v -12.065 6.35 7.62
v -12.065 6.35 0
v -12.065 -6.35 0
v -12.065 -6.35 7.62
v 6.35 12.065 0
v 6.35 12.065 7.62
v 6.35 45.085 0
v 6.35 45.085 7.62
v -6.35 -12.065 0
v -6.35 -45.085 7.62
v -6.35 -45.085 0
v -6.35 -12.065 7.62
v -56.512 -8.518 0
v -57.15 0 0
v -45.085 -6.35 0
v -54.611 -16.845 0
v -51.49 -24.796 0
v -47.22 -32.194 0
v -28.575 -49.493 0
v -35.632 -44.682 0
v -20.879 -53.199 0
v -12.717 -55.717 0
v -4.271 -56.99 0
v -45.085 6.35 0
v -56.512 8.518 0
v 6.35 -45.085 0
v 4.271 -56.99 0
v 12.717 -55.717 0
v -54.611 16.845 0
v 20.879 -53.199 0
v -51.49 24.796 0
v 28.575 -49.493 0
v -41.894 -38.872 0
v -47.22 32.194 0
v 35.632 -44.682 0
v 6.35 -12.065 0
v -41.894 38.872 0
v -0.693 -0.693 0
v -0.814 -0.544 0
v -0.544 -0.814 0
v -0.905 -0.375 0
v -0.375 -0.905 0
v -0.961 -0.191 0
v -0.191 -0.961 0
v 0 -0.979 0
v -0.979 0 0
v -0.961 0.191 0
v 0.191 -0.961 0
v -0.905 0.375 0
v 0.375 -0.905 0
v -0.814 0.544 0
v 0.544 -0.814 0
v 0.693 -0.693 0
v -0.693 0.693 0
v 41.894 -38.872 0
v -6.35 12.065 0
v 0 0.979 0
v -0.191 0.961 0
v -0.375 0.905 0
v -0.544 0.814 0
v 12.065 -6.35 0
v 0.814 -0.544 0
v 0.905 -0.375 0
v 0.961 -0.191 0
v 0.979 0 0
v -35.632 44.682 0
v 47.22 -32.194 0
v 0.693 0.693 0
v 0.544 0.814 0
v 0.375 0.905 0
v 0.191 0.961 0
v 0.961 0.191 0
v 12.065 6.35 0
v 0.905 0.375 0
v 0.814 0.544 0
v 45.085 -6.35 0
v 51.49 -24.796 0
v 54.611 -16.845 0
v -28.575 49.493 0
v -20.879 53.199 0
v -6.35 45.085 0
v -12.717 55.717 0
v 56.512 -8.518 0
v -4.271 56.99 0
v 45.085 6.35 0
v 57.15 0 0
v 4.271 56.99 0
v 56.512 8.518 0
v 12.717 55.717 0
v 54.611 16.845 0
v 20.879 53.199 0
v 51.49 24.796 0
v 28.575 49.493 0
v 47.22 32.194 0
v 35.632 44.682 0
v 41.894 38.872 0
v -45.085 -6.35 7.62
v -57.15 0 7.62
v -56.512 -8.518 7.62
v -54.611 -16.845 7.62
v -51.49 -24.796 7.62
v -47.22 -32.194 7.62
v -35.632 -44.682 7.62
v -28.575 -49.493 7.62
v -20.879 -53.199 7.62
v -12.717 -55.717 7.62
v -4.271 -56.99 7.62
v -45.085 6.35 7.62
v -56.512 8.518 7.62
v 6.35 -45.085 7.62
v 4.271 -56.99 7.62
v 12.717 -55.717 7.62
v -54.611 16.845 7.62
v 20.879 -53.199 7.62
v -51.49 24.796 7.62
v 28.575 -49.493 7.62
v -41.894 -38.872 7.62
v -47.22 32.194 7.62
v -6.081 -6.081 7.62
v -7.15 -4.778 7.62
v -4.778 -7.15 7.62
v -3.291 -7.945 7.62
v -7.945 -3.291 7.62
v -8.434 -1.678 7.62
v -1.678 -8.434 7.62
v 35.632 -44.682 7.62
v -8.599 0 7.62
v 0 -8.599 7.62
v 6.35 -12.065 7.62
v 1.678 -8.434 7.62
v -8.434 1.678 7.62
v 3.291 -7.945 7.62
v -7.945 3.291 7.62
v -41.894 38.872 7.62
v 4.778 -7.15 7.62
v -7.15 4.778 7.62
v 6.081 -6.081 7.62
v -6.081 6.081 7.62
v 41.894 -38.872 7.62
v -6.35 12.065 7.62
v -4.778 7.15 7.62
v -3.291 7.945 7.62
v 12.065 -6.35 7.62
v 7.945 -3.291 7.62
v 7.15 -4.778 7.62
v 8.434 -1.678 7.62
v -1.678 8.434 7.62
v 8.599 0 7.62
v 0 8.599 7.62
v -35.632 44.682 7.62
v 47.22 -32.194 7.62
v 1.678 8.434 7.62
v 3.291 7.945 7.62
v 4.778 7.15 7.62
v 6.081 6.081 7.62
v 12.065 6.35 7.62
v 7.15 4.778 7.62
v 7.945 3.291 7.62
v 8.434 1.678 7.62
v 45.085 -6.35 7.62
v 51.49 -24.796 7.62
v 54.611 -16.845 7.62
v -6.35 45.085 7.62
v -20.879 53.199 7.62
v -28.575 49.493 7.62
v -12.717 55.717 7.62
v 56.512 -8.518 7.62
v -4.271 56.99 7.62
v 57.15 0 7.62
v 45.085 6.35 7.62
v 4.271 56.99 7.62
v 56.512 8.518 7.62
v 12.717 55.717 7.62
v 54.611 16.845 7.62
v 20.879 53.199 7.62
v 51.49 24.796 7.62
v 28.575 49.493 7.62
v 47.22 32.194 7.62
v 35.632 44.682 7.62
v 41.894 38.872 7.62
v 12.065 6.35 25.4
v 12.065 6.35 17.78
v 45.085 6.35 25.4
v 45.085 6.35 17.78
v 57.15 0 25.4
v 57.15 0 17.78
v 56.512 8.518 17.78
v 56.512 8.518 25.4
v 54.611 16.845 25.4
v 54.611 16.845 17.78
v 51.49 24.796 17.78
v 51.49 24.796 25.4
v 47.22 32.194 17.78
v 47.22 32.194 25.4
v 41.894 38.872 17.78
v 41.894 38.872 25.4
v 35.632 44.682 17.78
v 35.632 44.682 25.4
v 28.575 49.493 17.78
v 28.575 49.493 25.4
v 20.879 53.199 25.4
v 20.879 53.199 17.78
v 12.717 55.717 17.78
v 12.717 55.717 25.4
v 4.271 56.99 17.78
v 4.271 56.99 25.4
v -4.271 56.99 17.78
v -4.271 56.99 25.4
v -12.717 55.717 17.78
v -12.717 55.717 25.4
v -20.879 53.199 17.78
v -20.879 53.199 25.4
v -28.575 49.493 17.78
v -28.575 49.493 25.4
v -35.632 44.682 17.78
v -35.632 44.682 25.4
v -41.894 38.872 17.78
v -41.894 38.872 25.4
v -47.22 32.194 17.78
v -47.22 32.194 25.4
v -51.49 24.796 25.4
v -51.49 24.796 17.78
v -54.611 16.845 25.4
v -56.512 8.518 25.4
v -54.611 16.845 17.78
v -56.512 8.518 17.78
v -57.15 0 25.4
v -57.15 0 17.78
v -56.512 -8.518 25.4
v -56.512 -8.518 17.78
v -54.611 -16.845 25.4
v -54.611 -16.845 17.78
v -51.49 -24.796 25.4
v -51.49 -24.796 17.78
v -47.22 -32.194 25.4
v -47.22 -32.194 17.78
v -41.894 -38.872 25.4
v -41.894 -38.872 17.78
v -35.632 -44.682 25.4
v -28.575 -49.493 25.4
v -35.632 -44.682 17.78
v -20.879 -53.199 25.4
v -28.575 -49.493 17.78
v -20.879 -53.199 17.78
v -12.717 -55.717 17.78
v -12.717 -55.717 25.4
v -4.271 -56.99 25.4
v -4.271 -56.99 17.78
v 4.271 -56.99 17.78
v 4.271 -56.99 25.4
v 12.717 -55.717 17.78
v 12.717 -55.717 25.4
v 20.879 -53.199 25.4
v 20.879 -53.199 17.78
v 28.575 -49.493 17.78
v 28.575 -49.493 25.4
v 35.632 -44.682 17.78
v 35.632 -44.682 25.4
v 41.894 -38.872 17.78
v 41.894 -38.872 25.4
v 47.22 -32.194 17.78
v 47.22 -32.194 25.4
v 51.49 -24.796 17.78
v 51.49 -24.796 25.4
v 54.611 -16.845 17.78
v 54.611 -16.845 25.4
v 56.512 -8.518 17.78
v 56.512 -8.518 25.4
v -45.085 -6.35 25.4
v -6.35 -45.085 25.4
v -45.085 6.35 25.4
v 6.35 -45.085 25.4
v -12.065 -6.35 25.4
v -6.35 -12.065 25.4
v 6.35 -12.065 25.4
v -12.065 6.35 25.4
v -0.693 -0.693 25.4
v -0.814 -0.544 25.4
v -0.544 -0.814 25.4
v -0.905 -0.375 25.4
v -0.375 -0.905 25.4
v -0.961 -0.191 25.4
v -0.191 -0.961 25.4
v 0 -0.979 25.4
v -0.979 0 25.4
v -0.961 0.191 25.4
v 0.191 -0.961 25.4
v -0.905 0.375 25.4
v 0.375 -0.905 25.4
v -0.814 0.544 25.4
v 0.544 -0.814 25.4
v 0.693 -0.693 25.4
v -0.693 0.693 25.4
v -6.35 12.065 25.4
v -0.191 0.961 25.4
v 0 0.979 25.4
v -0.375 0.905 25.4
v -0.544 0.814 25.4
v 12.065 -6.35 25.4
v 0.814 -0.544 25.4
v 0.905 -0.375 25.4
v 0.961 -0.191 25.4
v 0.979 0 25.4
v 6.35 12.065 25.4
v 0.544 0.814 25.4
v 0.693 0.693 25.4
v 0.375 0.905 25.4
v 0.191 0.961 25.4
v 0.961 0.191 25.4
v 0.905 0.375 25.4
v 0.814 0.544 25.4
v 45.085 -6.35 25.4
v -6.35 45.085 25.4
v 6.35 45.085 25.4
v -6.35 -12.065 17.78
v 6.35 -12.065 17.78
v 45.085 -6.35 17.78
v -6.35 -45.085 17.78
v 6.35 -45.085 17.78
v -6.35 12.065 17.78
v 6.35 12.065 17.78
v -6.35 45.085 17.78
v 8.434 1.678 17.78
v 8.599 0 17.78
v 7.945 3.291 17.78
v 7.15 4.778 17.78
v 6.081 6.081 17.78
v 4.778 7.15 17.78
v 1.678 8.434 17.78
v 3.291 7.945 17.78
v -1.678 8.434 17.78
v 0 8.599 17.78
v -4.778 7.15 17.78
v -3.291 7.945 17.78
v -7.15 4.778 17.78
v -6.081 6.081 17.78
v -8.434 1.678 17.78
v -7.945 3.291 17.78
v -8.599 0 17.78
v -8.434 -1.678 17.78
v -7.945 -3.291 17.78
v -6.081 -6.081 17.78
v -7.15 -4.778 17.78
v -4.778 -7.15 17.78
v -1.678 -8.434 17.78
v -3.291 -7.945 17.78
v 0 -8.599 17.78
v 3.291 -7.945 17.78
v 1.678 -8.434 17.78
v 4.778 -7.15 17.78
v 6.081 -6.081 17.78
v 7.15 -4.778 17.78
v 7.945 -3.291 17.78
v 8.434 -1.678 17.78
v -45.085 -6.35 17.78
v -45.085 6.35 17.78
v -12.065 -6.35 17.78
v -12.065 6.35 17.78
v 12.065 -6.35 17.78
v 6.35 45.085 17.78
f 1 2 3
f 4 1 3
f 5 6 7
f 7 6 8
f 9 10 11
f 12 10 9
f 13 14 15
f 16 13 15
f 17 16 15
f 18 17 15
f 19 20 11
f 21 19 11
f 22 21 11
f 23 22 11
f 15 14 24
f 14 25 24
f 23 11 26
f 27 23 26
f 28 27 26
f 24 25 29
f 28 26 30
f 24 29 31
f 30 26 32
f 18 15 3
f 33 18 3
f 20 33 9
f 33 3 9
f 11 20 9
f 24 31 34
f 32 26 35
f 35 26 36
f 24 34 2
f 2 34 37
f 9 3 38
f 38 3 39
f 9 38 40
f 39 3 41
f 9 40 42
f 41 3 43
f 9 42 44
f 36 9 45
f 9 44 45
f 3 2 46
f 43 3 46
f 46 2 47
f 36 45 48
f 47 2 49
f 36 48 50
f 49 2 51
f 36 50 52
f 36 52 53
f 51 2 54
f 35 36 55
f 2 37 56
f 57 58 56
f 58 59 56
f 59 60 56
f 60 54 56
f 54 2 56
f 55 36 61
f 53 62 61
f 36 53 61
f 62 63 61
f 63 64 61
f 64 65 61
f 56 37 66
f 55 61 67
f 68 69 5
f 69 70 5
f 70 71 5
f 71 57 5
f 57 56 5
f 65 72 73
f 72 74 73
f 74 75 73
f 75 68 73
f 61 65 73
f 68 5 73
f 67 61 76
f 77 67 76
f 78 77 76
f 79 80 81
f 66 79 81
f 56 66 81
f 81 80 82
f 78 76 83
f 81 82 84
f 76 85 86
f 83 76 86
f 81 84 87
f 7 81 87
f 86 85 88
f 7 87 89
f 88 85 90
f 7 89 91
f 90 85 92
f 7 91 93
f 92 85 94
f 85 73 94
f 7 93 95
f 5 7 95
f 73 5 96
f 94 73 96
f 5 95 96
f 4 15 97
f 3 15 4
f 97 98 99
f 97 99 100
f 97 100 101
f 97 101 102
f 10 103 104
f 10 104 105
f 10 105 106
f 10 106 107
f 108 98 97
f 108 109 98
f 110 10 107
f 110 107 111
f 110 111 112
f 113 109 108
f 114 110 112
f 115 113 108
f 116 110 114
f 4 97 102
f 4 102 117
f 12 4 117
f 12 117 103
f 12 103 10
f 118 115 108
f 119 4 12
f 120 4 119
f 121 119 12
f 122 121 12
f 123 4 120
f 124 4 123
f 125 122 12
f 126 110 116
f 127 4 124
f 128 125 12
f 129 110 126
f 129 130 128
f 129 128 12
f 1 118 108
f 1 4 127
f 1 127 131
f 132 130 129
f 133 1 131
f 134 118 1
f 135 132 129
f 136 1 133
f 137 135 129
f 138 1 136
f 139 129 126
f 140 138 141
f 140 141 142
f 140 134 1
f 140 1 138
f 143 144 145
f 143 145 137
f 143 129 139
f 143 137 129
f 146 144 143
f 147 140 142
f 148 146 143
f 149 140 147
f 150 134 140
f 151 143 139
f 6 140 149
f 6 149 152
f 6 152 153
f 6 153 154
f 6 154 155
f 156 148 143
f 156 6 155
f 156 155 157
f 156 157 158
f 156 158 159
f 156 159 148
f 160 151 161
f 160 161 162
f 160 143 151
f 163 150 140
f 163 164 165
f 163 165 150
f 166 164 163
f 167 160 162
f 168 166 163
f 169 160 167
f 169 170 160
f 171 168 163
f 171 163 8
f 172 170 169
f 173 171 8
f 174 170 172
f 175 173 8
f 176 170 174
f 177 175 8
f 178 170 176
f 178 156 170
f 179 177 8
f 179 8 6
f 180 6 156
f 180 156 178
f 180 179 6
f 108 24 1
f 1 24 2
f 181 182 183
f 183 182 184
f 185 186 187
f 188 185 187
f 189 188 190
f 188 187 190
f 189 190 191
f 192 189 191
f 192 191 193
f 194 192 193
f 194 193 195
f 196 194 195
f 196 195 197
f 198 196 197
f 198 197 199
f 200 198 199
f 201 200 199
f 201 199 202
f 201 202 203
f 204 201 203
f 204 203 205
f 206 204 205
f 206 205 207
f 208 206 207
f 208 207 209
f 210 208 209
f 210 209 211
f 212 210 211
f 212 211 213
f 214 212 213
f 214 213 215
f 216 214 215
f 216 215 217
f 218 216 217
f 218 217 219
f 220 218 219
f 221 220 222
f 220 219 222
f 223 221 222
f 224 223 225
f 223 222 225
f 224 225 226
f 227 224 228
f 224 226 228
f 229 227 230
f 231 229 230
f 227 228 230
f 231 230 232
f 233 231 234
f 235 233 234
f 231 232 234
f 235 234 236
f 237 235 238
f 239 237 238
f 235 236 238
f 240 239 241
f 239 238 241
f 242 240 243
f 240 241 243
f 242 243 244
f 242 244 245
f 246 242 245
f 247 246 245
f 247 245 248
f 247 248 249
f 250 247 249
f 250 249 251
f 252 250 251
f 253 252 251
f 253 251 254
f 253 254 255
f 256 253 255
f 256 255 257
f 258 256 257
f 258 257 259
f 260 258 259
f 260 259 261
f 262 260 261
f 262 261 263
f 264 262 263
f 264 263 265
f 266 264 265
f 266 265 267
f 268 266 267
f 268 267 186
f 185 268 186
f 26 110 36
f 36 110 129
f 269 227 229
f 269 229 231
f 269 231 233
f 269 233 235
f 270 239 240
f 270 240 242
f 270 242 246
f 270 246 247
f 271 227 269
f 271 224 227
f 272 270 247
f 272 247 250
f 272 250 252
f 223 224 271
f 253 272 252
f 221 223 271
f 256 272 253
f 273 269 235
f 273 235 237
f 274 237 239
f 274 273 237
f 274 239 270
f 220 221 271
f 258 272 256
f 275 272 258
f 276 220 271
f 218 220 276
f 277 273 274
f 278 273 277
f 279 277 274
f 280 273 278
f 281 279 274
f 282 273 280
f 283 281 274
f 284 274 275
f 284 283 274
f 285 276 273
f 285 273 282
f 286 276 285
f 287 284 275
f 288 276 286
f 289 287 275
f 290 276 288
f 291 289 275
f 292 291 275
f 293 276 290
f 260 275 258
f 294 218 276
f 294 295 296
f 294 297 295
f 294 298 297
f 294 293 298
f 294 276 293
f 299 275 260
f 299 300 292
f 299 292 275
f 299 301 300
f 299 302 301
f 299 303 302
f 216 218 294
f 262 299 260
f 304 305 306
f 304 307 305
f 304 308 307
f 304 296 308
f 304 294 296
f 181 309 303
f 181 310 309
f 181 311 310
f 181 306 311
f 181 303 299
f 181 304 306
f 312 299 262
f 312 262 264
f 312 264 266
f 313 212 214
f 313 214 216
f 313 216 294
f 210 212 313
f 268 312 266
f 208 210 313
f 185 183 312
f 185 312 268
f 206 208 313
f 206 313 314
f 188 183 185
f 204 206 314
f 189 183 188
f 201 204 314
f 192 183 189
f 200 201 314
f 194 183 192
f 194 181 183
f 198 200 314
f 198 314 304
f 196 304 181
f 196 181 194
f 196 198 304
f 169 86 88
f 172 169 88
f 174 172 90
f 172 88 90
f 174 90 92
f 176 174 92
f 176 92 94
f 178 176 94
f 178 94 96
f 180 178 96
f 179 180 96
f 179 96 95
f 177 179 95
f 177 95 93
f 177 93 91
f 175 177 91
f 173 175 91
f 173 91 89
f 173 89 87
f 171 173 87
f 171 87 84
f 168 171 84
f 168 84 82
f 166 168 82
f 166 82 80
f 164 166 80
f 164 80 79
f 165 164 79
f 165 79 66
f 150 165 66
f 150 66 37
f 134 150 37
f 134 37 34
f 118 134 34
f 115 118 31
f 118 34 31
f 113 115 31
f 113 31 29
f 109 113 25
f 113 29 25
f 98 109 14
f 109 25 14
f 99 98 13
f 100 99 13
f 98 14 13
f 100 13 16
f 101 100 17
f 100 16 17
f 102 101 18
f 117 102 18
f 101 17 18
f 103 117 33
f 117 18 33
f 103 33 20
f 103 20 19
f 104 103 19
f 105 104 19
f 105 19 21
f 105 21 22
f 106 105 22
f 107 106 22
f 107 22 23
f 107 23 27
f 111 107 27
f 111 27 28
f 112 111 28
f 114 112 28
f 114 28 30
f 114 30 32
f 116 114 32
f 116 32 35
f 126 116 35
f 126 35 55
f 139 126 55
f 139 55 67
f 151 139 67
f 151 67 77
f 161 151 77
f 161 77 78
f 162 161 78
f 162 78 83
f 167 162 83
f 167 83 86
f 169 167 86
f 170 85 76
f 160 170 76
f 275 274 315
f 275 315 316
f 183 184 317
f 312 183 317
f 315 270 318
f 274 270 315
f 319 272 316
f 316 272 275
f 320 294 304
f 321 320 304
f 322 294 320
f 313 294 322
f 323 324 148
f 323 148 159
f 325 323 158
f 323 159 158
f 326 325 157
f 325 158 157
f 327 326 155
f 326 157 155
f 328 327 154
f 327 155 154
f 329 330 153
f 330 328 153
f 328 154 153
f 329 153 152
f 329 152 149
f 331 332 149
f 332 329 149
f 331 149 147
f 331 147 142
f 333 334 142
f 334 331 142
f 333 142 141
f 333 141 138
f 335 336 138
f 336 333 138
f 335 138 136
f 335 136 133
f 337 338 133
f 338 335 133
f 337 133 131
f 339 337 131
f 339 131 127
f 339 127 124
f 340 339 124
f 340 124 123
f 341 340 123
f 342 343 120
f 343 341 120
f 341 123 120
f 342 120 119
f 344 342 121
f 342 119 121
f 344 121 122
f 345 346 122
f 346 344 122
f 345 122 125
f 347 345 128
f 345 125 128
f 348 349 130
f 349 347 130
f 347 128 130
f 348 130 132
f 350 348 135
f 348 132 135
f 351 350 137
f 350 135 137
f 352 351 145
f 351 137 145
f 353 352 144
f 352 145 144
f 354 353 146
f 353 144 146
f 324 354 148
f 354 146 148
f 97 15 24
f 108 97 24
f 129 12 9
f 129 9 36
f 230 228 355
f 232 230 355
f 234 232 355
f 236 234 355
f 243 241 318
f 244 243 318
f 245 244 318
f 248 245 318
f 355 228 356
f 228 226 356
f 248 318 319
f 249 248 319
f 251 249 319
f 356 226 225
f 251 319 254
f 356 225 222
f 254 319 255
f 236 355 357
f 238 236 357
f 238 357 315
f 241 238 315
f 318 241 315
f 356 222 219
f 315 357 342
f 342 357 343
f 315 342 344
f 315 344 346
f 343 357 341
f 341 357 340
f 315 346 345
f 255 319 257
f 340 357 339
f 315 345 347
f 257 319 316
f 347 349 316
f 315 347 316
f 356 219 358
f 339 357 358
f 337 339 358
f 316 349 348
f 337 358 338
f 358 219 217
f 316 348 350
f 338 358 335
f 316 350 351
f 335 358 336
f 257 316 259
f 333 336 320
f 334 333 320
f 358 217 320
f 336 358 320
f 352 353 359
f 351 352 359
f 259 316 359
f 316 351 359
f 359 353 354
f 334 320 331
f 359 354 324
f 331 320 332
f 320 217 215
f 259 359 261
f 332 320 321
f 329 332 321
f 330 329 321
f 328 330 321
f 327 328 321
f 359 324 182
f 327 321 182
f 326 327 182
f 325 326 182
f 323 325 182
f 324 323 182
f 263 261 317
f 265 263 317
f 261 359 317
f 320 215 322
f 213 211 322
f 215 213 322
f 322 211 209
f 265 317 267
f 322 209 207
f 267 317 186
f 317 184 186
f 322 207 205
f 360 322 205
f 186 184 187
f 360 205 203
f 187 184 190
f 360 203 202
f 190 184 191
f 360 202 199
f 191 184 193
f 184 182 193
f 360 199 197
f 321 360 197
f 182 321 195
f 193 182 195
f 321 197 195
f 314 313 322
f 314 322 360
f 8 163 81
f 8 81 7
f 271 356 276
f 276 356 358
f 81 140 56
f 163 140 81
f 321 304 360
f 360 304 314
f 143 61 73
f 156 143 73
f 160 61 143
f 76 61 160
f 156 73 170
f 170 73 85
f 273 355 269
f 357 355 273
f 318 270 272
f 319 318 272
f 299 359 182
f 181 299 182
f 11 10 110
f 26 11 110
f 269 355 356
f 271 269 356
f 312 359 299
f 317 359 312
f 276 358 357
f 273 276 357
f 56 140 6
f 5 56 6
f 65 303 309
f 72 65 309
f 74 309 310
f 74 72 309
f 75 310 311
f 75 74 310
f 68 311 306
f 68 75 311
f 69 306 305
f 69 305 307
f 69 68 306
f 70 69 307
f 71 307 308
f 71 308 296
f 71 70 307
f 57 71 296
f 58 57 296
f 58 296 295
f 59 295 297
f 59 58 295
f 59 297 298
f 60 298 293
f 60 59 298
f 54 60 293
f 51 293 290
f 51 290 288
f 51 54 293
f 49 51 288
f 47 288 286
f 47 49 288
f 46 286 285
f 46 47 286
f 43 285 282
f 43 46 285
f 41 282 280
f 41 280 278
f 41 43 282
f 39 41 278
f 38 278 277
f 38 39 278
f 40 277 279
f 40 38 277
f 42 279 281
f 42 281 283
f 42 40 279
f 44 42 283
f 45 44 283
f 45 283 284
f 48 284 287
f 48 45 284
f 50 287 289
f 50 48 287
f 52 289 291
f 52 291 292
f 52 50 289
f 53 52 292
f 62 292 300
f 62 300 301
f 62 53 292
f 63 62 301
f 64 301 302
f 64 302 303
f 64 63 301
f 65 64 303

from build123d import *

# Parameters (mm, degrees)
F0_R     = 57.15
F0_R_2   = 0.9794958553
F1_DEPTH = 25.4
F3_T     = -7.62
F4_W     = 12.7
F4_H     = 33.02
F5_DEPTH = 25.4
F6_DEPTH = 25.4
F7_W     = 33.02
F7_H     = 6.35
F8_DEPTH = 25.4


# Not quite as in the source:
# - a feature of the source that left no trace in its solid (it failed there, or was rolled back) is left out


with BuildPart() as f1:
    # F0 (on Top) → F1 (new body)
    with BuildSketch(Plane.XY):
        Circle(F0_R)
        Circle(F0_R_2, mode=Mode.SUBTRACT)
    extrude(amount=F1_DEPTH)

    # F3
    f3_openings = [f1.faces().sort_by_distance(p)[0] for p in [
        (-57.15, 0, 12.7),
    ]]
    offset(amount=F3_T, openings=f3_openings)

    # F4 (on face) → F5 (cut)
    with BuildSketch(Plane.XY.offset(25.4)):
        with Locations((0, -28.575)):
            Rectangle(F4_W, F4_H)
    extrude(amount=-F5_DEPTH, mode=Mode.SUBTRACT)

    # F4 (on face) → F6 (cut)
    with BuildSketch(Plane.XY.offset(25.4)):
        with Locations((0, 28.575)):
            Rectangle(F4_W, F4_H)
        with Locations((0, -28.575)):
            Rectangle(F4_W, F4_H)
    extrude(amount=-F6_DEPTH, mode=Mode.SUBTRACT)

    # F7 (on face) → F8 (cut)
    with BuildSketch(Plane(origin=(0, 0, 0), x_dir=(1, 0, 0), z_dir=(0, 0, -1))):
        with Locations((28.575, 3.175)):
            Rectangle(F7_W, F7_H)
        with Locations((28.575, -3.175)):
            Rectangle(F7_W, F7_H)
        with Locations((-28.575, -3.175)):
            Rectangle(F7_W, F7_H)
        with Locations((-28.575, 3.175)):
            Rectangle(F7_W, F7_H)
    extrude(amount=-F8_DEPTH, mode=Mode.SUBTRACT)


solid = f1.part
